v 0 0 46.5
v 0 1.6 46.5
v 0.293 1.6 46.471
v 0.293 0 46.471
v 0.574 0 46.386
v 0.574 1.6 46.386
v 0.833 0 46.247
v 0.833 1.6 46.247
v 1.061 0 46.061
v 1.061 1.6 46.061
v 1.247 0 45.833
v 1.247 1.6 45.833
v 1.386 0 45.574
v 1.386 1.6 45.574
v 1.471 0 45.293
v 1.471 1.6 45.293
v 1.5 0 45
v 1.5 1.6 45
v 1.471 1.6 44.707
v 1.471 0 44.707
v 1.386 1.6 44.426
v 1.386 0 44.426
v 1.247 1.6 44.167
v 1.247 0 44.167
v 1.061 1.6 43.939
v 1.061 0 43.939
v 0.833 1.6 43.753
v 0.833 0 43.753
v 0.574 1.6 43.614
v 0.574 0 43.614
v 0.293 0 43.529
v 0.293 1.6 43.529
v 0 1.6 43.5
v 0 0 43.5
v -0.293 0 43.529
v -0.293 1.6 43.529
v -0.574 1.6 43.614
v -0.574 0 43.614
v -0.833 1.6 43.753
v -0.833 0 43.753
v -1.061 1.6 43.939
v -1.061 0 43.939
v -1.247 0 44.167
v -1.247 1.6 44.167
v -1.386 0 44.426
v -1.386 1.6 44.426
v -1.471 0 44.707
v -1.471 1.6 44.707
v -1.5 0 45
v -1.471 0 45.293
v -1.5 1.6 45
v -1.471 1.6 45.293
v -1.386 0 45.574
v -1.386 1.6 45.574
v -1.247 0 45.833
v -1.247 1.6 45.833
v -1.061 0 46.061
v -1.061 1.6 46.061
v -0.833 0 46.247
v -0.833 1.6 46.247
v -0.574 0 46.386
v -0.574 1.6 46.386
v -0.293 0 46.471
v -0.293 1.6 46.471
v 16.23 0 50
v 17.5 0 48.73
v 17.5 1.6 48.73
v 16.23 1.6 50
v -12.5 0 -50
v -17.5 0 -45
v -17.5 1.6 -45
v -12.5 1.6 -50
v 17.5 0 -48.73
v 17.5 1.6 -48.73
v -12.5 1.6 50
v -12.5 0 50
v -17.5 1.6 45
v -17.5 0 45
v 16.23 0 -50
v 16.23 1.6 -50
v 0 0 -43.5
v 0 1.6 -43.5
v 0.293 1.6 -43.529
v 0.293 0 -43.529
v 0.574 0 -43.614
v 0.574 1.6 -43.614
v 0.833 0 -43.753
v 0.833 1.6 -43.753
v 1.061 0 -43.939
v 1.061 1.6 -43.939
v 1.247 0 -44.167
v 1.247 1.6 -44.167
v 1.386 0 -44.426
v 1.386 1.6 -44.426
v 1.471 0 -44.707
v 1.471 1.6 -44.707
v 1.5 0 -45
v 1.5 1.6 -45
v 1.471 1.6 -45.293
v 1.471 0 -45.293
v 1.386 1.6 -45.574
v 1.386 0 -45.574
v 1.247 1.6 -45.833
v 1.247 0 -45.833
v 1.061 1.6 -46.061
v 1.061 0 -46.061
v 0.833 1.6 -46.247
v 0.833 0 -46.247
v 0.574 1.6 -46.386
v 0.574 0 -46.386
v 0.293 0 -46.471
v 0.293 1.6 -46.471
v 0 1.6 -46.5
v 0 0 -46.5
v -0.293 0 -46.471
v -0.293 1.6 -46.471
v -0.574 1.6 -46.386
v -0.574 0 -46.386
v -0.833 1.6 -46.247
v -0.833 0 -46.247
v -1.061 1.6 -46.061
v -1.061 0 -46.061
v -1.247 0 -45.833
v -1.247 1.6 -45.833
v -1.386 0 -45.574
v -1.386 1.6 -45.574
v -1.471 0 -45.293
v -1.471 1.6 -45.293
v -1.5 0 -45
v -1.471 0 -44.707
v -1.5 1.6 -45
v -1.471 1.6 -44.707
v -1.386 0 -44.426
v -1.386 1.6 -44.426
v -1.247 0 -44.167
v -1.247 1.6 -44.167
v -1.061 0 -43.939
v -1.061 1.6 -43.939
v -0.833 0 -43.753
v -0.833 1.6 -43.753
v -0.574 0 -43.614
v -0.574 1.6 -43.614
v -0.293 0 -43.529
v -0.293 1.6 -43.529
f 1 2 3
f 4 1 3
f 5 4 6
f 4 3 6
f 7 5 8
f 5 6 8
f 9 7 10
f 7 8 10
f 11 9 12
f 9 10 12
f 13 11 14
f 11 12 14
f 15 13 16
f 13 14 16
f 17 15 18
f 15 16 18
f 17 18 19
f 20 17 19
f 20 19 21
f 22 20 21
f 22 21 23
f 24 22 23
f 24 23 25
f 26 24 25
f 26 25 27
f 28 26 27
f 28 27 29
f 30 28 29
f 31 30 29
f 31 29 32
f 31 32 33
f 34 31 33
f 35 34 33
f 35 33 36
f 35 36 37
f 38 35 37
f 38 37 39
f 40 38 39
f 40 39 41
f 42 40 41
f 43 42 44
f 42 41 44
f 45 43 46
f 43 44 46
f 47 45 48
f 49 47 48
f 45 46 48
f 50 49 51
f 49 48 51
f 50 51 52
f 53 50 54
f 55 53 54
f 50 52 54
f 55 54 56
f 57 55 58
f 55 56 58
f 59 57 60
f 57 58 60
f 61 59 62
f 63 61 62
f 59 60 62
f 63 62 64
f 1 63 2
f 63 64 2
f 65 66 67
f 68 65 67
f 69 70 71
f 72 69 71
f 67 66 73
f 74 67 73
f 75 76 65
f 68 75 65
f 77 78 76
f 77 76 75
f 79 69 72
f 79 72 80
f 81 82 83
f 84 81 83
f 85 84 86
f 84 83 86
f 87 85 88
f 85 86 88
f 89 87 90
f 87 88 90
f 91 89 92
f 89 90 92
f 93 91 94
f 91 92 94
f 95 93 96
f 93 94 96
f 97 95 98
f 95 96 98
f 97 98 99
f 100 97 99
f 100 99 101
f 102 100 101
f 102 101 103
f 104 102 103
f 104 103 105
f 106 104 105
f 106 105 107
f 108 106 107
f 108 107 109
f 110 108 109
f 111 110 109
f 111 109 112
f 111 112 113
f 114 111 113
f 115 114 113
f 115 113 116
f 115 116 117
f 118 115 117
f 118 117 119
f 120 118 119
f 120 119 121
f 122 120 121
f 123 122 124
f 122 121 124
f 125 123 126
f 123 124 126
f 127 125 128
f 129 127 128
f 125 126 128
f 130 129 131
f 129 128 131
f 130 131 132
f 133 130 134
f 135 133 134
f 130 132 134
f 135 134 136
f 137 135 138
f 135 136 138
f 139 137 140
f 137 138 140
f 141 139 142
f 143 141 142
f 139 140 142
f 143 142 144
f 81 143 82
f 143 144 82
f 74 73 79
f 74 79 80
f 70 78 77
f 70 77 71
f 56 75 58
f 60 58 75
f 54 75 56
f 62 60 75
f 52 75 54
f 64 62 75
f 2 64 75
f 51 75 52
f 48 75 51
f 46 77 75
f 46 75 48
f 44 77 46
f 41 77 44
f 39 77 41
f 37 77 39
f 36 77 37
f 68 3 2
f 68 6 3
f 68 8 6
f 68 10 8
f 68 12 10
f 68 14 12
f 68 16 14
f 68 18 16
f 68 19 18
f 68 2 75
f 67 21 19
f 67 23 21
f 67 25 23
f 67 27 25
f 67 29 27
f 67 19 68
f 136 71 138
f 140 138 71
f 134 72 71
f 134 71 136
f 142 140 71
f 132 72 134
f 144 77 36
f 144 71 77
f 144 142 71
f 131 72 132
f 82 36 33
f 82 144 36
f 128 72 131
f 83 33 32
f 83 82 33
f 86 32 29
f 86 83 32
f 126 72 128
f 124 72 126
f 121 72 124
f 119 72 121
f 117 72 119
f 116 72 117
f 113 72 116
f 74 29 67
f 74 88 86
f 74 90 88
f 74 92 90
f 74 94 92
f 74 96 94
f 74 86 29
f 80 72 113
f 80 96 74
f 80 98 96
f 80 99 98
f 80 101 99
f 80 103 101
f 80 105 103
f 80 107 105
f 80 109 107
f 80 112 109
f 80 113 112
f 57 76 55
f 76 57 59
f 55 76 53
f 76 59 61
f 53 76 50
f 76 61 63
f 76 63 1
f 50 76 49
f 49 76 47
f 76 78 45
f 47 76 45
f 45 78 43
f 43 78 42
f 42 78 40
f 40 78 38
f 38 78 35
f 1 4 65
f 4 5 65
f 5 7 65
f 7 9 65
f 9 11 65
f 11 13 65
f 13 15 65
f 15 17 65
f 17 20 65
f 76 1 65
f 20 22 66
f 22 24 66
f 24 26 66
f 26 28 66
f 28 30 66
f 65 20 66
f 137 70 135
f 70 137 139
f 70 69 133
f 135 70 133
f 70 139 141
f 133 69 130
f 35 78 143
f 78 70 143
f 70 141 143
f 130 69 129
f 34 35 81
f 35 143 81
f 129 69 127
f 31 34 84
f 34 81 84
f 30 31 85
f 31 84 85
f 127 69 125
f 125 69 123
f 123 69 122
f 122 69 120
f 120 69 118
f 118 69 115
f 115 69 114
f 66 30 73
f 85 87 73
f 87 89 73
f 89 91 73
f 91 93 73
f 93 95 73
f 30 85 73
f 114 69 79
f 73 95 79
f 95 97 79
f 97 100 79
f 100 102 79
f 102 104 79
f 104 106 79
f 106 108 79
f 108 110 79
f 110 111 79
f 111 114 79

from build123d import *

# Parameters (mm, degrees)
SKETCH1_W           = 35
SKETCH1_H           = 100
BOSS_EXTRUDE1_DEPTH = 1.6
CHAMFER1_SIZE       = 5
CHAMFER2_SIZE       = 1.27
SKETCH2_R           = 1.5
CUT_EXTRUDE1_DEPTH  = 10


with BuildPart() as part:
    # Sketch1 → Boss-Extrude1 (new body)
    with BuildSketch(Plane(origin=(0, 0, 0), x_dir=(1, 0, 0), z_dir=(0, 1, 0))):
        Rectangle(SKETCH1_W, SKETCH1_H)
    extrude(amount=BOSS_EXTRUDE1_DEPTH)

    # Chamfer1
    chamfer1_edges = [part.edges().sort_by_distance(p)[0] for p in [
        (-17.5, 0.8, 50),
        (-17.5, 0.8, -50),
    ]]
    chamfer(chamfer1_edges, length=CHAMFER1_SIZE)

    # Chamfer2
    chamfer2_edges = [part.edges().sort_by_distance(p)[0] for p in [
        (17.5, 0.8, 50),
        (17.5, 0.8, -50),
    ]]
    chamfer(chamfer2_edges, length=CHAMFER2_SIZE)

    # Sketch2 → Cut-Extrude1 (cut)
    with BuildSketch(Plane(origin=(0, 1.6, 0), x_dir=(-1, 0, 0), z_dir=(0, 1, 0))):
        with Locations(Location((0, -45, 0), (0, 0, 90))):
            Circle(SKETCH2_R)
        with Locations(Location((0, 45, 0), (0, 0, 90))):
            Circle(SKETCH2_R)
    extrude(amount=-CUT_EXTRUDE1_DEPTH, mode=Mode.SUBTRACT)


solid = part.part
